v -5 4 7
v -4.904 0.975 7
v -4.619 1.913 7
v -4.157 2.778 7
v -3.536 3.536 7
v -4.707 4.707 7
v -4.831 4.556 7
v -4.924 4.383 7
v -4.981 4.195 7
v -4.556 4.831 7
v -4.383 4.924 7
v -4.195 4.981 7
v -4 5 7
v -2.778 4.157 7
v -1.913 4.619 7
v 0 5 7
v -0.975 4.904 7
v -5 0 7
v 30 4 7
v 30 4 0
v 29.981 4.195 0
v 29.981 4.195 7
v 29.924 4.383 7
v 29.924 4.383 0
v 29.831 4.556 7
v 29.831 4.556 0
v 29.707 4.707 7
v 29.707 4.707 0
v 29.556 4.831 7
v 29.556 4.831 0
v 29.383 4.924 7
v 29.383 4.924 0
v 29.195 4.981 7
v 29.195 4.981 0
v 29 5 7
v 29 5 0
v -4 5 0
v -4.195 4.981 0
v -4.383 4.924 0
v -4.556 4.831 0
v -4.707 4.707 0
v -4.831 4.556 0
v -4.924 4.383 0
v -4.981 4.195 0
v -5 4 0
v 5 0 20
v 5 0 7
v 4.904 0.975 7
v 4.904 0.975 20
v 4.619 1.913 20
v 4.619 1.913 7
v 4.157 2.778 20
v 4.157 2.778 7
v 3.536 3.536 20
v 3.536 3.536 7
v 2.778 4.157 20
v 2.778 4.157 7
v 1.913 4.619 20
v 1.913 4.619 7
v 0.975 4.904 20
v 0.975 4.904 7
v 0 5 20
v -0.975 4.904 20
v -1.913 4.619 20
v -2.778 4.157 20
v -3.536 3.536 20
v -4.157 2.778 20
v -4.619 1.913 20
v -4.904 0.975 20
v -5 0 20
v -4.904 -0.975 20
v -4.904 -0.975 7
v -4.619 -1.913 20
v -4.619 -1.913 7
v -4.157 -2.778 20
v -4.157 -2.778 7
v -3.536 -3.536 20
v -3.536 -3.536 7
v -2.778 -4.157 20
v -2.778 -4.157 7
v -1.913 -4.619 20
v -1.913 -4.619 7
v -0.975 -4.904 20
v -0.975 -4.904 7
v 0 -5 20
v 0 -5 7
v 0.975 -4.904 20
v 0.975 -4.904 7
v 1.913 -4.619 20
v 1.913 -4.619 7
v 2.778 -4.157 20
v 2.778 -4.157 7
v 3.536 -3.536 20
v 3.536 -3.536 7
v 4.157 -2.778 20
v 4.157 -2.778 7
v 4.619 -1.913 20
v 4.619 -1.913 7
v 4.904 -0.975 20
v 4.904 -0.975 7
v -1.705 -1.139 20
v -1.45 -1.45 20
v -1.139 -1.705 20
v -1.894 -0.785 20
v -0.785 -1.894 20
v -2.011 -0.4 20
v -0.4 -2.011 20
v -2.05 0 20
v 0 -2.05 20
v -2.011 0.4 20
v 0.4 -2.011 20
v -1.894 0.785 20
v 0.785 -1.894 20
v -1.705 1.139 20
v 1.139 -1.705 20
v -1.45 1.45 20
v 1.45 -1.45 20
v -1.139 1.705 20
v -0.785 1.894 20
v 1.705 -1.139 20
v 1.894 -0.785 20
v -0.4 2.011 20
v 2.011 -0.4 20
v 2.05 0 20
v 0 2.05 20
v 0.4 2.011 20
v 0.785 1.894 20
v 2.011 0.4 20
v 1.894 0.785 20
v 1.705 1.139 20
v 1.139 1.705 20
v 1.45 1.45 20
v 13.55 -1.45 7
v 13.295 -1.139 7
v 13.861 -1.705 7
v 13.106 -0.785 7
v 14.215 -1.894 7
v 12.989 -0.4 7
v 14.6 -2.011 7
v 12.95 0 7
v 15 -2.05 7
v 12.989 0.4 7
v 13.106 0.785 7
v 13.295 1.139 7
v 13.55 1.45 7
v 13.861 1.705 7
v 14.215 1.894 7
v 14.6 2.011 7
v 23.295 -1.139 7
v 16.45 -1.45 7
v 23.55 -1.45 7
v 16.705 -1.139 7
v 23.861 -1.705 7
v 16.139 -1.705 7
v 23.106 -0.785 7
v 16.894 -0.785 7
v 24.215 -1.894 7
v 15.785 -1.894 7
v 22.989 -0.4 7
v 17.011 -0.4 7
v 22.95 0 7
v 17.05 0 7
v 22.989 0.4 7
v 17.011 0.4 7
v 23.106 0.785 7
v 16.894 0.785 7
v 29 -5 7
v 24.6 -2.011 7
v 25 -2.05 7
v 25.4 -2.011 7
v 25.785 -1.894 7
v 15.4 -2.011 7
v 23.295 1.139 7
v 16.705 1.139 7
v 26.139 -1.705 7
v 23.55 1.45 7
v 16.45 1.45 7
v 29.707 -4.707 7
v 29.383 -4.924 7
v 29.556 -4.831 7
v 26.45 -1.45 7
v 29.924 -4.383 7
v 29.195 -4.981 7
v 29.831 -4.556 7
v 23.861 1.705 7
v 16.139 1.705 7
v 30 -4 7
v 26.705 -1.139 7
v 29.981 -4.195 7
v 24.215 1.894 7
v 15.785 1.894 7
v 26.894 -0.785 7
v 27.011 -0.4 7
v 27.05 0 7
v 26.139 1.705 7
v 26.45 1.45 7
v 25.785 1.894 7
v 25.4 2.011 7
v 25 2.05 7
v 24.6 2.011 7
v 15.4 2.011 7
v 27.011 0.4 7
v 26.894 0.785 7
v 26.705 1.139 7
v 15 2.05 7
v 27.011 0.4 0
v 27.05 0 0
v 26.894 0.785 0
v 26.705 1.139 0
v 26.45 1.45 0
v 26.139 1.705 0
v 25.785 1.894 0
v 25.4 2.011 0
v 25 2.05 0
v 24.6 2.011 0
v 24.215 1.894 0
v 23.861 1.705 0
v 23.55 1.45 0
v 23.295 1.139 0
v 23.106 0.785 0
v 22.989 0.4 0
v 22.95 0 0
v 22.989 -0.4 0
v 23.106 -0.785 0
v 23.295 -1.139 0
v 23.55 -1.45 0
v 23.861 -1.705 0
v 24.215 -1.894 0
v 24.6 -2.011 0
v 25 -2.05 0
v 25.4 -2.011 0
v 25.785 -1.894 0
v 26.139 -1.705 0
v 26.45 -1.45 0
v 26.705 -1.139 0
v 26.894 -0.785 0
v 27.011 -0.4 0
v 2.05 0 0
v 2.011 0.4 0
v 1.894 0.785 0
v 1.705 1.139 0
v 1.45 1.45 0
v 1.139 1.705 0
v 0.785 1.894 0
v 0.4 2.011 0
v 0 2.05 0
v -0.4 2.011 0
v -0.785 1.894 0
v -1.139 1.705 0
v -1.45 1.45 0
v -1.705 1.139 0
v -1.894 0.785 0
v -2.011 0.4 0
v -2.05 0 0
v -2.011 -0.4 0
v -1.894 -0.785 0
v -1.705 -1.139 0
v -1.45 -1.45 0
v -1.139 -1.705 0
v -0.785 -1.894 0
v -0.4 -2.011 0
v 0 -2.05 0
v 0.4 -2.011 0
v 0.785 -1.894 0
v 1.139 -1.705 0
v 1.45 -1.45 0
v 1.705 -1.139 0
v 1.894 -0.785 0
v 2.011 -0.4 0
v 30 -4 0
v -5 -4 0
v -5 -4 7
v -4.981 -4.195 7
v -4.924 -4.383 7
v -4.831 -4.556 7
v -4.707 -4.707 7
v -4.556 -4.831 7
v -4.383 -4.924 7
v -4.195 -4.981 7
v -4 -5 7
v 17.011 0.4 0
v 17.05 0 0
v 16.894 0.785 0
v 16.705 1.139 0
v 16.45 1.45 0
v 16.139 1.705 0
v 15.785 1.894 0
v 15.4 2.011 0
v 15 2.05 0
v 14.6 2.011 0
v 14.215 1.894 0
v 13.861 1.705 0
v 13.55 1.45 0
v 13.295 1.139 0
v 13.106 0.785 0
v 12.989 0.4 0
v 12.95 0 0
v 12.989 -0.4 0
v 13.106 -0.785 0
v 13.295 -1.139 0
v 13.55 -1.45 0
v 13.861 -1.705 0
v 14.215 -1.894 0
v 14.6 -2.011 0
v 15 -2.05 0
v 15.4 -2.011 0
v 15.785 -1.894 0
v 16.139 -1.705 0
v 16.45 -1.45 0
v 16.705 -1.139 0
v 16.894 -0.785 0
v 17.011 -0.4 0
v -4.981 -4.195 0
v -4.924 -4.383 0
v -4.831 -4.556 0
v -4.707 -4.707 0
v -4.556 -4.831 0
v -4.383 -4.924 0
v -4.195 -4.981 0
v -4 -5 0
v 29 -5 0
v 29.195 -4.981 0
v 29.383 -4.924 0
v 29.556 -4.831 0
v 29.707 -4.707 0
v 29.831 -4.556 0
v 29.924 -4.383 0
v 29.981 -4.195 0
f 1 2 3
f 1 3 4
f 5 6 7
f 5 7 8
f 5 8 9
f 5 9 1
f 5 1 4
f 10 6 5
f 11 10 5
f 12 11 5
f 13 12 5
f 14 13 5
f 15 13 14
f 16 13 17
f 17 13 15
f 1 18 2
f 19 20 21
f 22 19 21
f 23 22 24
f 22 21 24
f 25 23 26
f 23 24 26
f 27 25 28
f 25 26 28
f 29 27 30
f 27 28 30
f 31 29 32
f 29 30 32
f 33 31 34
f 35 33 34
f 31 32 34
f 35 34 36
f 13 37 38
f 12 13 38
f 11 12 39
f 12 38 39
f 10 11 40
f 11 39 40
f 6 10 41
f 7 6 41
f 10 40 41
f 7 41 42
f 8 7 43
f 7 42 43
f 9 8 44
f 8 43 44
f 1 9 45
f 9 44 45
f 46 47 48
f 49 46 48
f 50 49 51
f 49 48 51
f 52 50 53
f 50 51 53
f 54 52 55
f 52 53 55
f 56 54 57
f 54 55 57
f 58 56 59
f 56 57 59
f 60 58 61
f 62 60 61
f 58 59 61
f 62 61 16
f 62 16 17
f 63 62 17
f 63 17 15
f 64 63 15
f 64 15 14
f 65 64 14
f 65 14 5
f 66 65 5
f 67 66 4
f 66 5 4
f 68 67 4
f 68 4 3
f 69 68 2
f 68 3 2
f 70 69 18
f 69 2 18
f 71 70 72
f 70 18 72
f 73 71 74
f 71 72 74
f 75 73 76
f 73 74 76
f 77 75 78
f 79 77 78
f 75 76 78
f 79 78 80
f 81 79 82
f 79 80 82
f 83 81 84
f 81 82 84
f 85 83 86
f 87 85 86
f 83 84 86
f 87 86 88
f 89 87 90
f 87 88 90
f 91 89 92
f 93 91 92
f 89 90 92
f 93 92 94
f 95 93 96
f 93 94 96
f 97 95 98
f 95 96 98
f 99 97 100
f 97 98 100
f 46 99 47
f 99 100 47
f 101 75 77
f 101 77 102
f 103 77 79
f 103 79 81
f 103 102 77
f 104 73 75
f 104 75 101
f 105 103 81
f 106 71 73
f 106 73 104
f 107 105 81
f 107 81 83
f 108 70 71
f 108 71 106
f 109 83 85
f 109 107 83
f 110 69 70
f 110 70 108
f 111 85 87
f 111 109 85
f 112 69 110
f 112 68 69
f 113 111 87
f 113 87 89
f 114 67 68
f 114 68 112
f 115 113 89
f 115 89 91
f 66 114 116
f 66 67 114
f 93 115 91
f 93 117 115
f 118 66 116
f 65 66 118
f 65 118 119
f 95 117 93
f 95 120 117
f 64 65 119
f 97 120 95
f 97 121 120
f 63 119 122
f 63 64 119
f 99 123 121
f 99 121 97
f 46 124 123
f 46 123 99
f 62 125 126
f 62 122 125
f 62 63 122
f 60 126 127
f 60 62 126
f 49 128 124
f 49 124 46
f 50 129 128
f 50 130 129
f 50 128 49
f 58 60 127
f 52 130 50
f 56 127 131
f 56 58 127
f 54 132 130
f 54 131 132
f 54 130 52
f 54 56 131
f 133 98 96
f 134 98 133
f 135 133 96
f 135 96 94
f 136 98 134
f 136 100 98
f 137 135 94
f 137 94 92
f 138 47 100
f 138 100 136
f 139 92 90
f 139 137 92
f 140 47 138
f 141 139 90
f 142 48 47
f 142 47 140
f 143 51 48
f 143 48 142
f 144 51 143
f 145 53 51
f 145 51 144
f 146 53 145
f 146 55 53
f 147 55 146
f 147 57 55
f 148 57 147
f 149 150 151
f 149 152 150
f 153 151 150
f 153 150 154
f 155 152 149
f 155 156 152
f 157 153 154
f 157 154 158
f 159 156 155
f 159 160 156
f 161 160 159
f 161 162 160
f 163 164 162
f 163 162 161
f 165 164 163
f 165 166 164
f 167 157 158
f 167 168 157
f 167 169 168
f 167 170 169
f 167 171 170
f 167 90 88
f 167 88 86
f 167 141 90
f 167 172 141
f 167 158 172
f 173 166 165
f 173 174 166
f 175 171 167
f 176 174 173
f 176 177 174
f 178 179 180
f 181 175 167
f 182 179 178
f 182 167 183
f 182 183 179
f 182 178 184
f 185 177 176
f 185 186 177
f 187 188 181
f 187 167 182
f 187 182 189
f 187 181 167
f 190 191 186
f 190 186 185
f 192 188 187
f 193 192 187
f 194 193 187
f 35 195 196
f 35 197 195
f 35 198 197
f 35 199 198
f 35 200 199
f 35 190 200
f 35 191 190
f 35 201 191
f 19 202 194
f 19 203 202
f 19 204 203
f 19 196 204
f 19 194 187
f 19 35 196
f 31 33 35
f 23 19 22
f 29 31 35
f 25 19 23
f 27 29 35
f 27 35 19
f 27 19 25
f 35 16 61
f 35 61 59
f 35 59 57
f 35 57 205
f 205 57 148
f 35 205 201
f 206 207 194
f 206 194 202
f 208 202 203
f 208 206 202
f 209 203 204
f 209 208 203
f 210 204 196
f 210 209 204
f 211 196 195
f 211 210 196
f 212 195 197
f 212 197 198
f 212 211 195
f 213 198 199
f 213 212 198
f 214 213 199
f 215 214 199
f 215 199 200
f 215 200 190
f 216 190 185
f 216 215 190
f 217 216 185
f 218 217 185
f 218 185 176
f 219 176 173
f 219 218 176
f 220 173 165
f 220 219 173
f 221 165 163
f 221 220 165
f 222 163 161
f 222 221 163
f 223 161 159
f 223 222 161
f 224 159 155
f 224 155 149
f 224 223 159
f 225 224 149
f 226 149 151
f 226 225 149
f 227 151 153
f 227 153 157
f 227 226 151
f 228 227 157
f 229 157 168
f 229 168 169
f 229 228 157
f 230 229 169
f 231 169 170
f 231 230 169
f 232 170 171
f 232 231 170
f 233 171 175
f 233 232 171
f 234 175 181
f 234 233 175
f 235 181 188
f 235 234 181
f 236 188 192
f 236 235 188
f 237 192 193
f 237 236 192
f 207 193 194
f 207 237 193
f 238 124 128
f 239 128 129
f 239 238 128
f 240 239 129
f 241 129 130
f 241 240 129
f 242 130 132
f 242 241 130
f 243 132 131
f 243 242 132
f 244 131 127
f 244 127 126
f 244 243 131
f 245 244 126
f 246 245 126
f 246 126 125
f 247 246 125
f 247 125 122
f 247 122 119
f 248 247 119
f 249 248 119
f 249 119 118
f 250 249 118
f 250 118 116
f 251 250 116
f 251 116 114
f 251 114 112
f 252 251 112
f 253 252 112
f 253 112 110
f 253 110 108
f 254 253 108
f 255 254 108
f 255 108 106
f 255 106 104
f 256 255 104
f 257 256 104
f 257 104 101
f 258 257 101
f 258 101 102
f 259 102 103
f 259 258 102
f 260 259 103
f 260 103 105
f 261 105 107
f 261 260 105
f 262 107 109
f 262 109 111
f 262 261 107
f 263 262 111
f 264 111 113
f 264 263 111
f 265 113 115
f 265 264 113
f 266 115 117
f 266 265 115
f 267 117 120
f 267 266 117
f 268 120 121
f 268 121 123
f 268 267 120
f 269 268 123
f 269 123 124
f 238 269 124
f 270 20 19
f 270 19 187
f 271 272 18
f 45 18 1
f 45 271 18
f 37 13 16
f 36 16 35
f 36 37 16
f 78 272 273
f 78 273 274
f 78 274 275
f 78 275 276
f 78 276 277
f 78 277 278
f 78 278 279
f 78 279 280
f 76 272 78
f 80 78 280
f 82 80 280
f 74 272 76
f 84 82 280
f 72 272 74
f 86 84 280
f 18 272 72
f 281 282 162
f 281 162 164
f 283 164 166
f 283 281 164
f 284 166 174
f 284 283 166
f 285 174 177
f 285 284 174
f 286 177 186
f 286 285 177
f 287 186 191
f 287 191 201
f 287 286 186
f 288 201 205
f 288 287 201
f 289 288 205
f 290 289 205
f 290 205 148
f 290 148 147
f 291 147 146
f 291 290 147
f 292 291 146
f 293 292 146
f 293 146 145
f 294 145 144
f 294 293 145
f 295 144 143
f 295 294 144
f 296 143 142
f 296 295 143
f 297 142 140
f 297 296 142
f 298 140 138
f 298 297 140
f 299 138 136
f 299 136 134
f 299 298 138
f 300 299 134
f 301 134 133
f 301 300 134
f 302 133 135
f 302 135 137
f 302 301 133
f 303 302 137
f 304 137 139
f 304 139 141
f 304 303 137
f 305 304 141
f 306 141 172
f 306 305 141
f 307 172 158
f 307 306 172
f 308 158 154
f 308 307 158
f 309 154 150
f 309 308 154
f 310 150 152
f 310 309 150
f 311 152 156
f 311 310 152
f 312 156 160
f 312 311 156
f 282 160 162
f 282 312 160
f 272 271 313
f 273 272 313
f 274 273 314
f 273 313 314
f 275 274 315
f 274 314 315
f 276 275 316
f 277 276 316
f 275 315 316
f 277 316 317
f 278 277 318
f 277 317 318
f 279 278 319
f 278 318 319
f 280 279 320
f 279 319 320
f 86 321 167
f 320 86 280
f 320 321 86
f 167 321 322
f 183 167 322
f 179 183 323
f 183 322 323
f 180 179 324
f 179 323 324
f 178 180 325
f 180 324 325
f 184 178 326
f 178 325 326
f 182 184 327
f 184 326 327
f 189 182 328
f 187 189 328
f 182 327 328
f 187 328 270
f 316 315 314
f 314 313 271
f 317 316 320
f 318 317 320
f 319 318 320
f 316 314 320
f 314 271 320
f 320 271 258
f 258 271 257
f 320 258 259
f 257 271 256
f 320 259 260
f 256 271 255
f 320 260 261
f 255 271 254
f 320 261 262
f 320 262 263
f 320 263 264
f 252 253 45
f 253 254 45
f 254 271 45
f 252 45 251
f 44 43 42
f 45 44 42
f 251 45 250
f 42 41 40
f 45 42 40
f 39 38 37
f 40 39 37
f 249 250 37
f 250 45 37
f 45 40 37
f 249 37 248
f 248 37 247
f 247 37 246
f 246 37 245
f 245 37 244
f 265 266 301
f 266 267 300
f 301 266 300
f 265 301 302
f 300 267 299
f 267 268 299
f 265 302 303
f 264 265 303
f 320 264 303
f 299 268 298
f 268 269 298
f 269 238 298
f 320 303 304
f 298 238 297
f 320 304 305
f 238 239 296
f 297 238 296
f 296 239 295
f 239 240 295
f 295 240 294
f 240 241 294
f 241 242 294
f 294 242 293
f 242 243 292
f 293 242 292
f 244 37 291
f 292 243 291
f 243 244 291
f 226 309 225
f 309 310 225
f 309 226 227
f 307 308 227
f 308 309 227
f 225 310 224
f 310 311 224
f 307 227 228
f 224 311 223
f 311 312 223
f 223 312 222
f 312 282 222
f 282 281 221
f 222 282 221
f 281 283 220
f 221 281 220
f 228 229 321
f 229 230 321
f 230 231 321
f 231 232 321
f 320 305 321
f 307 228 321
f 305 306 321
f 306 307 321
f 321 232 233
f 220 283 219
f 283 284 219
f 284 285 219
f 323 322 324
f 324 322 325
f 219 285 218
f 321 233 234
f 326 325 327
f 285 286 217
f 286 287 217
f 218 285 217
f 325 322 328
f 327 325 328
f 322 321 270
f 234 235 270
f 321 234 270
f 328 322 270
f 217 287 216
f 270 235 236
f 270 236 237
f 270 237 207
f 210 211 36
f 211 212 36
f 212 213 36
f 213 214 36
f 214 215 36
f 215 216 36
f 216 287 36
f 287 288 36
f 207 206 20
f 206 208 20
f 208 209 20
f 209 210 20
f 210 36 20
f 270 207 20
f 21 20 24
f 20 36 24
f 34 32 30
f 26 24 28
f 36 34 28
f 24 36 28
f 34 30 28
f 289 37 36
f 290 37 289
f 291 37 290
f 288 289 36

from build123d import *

# Parameters (mm, degrees)
SKETCH_R      = 2.05
PAD_DEPTH     = 7
SKETCH001_R   = 5
SKETCH001_R_2 = 2.05
PAD001_DEPTH  = 20


with BuildPart() as part:
    # Sketch → Pad (new body)
    with BuildSketch(Plane.XY):
        with BuildLine():
            ThreePointArc((-4, 5), (-4.707107, 4.707107), (-5, 4))
            Line((-5, -4), (-5, 4))
            ThreePointArc((-5, -4), (-4.707107, -4.707107), (-4, -5))
            Line((29, -5), (-4, -5))
            ThreePointArc((29, -5), (29.707107, -4.707107), (30, -4))
            Line((30, 4), (30, -4))
            ThreePointArc((30, 4), (29.707107, 4.707107), (29, 5))
            Line((-4, 5), (29, 5))
        make_face()
        Circle(SKETCH_R, mode=Mode.SUBTRACT)
        with Locations((15, 0)):
            Circle(SKETCH_R, mode=Mode.SUBTRACT)
        with Locations((25, 0)):
            Circle(SKETCH_R, mode=Mode.SUBTRACT)
    extrude(amount=PAD_DEPTH)

    # Sketch001 → Pad001 (join)
    with BuildSketch(Plane.XY):
        Circle(SKETCH001_R)
        Circle(SKETCH001_R_2, mode=Mode.SUBTRACT)
    extrude(amount=PAD001_DEPTH)


solid = part.part
